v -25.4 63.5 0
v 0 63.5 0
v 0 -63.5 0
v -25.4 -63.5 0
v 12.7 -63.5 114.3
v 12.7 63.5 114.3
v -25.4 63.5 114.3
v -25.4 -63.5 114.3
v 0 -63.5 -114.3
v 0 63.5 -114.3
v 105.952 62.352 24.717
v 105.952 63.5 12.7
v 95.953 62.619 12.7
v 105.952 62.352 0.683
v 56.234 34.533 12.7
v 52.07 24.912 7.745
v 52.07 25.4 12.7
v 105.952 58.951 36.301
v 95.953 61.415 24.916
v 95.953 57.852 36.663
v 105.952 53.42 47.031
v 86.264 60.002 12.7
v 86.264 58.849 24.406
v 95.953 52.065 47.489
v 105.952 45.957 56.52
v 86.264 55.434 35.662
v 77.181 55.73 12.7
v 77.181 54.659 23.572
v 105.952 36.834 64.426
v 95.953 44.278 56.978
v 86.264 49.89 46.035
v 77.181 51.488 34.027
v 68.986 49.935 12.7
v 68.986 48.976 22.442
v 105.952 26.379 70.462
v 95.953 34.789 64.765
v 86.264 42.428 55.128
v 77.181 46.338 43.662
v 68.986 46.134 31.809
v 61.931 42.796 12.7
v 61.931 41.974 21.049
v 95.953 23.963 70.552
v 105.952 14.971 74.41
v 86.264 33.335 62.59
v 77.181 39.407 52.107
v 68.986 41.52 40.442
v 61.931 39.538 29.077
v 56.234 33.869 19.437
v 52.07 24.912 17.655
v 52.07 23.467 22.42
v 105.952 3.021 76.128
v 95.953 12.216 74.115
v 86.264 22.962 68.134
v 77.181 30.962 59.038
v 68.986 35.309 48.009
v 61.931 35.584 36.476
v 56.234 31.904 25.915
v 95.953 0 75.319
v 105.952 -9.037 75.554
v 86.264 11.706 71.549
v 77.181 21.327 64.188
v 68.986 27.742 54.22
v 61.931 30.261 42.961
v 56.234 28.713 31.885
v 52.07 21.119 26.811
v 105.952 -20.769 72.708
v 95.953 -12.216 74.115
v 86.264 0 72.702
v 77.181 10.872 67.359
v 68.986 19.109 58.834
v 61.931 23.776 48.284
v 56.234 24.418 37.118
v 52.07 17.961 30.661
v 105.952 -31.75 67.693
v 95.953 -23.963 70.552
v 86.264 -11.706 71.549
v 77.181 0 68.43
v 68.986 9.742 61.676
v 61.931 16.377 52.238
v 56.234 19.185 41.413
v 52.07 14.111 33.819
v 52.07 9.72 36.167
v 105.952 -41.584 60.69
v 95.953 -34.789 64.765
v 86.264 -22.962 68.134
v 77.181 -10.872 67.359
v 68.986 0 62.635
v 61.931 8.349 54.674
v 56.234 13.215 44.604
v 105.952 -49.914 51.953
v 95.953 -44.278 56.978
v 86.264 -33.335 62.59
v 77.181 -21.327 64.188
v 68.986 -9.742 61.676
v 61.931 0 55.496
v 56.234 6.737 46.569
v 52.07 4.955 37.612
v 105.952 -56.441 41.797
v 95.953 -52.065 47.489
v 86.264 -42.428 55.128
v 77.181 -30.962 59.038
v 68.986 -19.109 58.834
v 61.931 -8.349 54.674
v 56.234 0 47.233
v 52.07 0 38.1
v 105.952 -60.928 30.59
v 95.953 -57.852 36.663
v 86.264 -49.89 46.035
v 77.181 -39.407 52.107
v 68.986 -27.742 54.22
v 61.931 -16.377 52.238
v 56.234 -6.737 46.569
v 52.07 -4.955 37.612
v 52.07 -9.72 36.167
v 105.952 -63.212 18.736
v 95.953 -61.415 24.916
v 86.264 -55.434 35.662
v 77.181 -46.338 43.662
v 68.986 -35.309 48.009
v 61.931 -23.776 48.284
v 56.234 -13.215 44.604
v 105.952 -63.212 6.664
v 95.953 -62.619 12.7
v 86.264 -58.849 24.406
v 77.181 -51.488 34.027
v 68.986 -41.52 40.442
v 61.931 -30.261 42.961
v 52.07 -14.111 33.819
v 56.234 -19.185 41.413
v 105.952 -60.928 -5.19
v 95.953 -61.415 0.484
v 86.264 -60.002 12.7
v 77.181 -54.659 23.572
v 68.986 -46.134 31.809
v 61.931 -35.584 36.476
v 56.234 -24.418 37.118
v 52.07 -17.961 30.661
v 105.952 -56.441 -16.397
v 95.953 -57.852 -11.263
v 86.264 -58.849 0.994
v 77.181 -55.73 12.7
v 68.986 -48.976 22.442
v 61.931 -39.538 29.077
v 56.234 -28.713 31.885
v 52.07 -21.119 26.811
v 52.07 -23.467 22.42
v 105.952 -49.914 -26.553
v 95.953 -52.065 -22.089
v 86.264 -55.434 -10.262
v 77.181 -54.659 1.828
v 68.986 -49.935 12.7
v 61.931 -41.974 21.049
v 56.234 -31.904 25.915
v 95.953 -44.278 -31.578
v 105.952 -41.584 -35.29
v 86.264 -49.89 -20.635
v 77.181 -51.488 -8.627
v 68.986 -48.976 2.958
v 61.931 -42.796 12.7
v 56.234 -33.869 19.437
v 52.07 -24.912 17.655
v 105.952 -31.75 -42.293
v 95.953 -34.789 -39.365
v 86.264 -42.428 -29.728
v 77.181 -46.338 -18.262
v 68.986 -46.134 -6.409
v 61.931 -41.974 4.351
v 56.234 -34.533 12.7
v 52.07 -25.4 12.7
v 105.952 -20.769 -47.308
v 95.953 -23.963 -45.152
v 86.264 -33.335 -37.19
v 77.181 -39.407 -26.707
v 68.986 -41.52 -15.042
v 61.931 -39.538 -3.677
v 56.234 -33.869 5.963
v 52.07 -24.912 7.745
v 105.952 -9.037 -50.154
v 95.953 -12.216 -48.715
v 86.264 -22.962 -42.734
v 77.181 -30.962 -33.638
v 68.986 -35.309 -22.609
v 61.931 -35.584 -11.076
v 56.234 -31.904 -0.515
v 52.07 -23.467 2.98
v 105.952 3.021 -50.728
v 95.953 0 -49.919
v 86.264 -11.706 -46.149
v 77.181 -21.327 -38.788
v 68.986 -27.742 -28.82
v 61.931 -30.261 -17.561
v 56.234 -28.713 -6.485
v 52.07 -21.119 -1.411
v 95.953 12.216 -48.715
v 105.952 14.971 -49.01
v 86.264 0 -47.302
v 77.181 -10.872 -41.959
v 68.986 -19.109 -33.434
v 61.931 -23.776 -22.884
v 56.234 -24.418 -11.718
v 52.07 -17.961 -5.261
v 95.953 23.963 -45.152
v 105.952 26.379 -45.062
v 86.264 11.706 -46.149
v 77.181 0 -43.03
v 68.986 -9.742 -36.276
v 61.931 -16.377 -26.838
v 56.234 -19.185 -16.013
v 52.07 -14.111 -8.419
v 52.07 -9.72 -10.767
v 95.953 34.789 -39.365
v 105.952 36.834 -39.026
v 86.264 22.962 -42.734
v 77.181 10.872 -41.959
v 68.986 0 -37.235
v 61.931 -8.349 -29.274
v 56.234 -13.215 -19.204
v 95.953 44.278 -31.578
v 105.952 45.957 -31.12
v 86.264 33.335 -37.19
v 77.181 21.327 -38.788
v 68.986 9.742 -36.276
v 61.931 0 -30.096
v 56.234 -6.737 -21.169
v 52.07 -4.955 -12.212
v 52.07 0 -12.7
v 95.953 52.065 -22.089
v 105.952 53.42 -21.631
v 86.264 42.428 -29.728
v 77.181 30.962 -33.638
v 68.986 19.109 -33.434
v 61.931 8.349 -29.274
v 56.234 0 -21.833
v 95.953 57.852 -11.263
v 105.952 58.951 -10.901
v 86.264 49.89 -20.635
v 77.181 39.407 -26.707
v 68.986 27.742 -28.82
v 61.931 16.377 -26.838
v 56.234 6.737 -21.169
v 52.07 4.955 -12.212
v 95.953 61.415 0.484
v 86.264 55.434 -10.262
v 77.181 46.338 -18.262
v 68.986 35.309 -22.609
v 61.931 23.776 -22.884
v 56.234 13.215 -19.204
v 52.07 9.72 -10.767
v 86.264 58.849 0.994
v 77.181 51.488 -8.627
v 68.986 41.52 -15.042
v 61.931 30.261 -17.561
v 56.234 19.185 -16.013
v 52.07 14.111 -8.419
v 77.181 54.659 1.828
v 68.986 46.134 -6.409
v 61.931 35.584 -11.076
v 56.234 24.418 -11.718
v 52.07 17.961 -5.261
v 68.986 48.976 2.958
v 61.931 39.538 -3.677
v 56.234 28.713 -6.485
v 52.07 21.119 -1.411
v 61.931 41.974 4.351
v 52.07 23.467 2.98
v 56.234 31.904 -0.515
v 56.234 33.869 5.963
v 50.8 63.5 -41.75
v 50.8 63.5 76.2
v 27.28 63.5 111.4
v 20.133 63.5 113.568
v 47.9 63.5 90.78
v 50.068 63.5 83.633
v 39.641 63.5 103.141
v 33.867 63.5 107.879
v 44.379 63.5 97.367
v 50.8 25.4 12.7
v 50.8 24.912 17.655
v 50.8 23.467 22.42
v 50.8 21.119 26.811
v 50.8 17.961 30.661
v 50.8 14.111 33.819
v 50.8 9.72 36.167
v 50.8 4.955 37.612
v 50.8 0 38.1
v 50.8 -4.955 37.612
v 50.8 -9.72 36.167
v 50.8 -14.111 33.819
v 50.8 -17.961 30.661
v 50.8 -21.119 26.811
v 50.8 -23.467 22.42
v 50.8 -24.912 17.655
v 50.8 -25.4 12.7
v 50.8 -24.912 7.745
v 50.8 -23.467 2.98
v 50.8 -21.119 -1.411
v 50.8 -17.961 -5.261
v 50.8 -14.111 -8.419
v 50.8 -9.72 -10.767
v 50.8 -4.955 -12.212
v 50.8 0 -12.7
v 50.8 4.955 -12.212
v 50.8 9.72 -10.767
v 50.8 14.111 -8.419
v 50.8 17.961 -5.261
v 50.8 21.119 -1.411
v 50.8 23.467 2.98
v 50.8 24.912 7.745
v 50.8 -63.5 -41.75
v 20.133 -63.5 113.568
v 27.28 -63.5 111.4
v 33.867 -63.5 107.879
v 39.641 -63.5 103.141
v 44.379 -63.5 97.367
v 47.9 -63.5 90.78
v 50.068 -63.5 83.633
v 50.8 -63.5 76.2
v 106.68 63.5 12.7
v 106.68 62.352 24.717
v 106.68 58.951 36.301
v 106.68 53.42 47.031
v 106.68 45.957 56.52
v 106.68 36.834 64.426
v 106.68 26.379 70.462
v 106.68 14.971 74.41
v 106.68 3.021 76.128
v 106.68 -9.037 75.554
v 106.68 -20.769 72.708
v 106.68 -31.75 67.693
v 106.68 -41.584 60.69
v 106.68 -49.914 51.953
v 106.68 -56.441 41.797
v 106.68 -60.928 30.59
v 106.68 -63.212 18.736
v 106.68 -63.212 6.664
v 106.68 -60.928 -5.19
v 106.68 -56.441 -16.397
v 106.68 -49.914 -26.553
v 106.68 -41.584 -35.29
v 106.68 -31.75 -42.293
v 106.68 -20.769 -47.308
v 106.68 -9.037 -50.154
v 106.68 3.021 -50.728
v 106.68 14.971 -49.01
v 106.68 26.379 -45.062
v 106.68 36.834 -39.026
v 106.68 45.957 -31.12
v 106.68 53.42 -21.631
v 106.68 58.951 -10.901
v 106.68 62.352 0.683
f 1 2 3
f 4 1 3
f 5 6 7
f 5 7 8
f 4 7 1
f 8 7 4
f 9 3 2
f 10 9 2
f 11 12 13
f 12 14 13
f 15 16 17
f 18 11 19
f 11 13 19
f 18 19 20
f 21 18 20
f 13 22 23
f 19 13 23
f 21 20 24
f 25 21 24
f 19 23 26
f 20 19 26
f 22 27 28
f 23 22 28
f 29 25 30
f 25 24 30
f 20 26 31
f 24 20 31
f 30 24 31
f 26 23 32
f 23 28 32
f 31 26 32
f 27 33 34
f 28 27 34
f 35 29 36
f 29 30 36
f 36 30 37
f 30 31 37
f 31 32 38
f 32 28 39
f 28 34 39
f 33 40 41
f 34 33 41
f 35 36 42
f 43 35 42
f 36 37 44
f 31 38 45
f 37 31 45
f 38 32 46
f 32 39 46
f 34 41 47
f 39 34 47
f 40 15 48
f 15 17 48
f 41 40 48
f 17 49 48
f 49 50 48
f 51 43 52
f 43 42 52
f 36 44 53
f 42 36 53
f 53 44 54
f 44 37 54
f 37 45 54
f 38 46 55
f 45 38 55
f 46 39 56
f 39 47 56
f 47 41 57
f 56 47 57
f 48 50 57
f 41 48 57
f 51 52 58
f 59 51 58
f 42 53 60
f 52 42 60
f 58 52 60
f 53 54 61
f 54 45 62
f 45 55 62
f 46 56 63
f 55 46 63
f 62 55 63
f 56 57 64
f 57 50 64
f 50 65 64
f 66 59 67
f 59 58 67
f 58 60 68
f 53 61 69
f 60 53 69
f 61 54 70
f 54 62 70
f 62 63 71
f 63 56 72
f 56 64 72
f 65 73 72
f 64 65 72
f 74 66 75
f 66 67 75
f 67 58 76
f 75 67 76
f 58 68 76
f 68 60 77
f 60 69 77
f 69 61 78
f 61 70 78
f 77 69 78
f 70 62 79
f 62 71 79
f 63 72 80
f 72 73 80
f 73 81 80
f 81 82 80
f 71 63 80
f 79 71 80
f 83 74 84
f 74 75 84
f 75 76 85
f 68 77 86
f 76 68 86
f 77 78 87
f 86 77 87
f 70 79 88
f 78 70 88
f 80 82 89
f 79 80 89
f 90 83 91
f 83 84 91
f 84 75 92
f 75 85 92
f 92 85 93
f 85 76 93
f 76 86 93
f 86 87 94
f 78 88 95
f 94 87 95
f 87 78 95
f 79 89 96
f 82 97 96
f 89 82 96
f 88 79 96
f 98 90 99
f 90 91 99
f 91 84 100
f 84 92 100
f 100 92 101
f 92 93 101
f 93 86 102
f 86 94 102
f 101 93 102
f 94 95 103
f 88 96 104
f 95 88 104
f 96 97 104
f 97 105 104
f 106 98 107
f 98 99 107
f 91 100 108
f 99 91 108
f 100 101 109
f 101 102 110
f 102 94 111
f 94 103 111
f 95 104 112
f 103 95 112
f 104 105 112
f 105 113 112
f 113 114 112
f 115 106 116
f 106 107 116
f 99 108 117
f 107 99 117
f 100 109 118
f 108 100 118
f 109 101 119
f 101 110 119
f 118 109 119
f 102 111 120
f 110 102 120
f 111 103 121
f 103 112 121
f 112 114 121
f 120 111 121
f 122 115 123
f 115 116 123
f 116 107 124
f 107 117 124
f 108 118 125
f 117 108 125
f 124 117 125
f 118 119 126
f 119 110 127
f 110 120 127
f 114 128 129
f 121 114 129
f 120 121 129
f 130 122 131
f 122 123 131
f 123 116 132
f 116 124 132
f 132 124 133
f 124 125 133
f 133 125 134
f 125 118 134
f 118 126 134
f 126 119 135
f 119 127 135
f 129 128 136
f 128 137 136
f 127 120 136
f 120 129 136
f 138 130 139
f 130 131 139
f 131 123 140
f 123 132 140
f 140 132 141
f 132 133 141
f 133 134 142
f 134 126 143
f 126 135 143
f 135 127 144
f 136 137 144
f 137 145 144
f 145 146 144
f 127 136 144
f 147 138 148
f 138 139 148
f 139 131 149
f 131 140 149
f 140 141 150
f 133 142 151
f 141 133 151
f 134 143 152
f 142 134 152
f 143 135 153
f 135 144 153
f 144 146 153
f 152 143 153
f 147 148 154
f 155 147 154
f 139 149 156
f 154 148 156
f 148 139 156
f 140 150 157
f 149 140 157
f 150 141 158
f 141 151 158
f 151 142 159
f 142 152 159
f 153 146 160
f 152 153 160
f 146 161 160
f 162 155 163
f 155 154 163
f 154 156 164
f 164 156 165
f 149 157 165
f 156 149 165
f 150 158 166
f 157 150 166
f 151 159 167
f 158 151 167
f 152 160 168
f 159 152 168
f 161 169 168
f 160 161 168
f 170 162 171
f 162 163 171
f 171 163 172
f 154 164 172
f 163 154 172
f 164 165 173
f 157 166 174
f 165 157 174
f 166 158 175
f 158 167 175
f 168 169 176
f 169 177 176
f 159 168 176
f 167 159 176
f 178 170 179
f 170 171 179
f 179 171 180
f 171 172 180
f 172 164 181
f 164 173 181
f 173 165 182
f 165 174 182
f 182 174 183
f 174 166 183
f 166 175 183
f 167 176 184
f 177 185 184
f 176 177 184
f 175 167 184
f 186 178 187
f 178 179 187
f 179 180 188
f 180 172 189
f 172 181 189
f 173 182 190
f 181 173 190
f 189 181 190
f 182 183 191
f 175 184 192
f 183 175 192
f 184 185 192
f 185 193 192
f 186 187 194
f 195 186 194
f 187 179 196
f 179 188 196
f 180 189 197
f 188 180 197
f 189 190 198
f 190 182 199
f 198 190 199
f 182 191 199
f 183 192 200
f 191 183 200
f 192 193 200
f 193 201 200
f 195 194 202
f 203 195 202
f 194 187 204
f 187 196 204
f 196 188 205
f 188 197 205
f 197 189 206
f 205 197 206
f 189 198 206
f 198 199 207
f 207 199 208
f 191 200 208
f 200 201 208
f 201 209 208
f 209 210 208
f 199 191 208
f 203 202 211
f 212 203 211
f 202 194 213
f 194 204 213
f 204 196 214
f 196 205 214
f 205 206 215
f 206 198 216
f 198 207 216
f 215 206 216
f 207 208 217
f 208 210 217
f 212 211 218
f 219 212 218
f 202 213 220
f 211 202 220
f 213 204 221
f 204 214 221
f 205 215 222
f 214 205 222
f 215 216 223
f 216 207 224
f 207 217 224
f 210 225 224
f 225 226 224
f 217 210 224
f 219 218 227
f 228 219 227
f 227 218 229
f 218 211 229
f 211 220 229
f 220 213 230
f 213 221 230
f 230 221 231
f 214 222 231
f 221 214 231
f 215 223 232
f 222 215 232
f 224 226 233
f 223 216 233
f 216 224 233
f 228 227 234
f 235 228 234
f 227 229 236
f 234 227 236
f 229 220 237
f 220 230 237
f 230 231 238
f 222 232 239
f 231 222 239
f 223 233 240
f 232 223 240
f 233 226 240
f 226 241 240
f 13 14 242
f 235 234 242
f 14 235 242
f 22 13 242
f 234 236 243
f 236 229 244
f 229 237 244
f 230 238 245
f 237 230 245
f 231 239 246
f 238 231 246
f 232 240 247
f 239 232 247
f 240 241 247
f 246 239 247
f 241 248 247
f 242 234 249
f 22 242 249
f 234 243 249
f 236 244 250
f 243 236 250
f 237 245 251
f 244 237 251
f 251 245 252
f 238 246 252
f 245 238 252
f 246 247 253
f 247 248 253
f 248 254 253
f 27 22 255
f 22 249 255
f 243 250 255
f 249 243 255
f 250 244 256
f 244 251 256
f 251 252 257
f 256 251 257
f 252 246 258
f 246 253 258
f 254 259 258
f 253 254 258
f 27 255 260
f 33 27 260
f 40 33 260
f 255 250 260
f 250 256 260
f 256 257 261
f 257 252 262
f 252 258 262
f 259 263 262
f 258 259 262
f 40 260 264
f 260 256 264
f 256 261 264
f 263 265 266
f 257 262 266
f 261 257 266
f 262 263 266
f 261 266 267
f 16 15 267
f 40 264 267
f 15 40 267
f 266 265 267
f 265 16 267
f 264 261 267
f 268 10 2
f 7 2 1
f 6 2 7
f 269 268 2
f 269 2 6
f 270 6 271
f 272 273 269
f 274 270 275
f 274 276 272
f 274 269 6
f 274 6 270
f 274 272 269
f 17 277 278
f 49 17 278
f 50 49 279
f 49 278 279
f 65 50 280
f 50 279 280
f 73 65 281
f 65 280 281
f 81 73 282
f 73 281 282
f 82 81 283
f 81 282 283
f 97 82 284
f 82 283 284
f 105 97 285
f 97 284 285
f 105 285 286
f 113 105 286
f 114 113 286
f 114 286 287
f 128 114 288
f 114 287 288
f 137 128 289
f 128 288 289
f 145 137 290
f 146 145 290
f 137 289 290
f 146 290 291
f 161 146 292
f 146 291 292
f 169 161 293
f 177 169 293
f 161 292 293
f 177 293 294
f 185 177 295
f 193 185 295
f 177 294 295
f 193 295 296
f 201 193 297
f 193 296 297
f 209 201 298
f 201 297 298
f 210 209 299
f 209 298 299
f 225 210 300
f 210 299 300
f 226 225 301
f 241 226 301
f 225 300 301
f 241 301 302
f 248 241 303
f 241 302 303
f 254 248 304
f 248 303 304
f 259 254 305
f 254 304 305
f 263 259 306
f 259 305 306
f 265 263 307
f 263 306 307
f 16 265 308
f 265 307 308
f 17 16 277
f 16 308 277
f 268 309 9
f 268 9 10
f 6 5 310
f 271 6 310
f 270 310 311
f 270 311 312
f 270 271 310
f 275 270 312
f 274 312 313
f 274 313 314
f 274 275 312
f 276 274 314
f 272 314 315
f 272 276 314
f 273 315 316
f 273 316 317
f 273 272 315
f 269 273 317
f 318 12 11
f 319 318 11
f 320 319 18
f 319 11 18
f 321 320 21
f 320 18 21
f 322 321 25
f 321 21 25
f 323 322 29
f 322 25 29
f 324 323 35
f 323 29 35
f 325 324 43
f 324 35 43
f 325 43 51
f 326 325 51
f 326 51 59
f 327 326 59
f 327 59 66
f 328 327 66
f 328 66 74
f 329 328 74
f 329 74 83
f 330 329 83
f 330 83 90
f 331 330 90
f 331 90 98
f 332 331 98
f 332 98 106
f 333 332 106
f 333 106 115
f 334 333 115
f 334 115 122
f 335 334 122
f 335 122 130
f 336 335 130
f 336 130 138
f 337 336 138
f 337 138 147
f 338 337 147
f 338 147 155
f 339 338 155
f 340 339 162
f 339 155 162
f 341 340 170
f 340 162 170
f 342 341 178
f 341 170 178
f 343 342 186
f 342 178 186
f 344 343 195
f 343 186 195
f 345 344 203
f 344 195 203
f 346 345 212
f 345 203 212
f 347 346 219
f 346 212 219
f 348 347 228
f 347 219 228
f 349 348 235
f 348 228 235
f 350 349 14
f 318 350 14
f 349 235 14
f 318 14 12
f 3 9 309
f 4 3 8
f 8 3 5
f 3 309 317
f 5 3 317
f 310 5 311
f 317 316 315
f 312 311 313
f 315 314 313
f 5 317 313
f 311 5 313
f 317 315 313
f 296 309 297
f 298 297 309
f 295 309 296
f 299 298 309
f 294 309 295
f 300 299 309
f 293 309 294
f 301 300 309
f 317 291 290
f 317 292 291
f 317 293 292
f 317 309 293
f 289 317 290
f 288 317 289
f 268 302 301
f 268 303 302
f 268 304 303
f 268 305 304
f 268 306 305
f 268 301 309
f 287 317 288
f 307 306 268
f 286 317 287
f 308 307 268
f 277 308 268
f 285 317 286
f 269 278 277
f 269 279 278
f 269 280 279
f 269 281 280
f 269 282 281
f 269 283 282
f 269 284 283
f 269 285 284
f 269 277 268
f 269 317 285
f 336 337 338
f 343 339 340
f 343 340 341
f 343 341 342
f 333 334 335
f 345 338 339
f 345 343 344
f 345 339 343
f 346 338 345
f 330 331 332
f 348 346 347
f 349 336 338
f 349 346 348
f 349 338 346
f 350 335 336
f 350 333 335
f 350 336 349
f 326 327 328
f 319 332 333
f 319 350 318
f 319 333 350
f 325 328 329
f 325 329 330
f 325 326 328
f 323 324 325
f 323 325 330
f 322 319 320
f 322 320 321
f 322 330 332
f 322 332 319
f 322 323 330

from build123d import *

# Parameters (mm, degrees)
F0_W      = 127
F0_H      = 228.6
F1_DEPTH  = 50.8
F2_R      = 38.1
F3_SIZE2  = 72.549909
F3_SIZE   = 50.79999
F4_W      = 127
F4_H      = 12.7
F5_DEPTH  = 25.4
F6_W      = 127
F6_H      = 101.6
F7_DEPTH  = 25.4
F8_R      = 25.4
F9_DEPTH  = 1.27
F10_R     = 63.5
F11_DEPTH = 54.61


# Not quite as in the source:
# - a fillet or chamfer that OpenCascade refuses, or shapes differently, is made with other operations: its cross-section is extruded or revolved along the edge and cut away or added
# - a fillet or chamfer is up to 0.001 mm smaller than in the source, because OpenCascade refuses the exact size


with BuildPart() as f1:
    # F0 (on Right) → F1 (new body)
    with BuildSketch(Plane.YZ):
        Rectangle(F0_W, F0_H)
    extrude(amount=F1_DEPTH)

    # F2
    f2_edges = [f1.edges().sort_by_distance(p)[0] for p in [
        (50.8, 0, 114.3),
    ]]
    fillet(f2_edges, radius=F2_R)

    # F3 (size 50.8 and 72.5499187425 in the source; OpenCascade refuses exactly that, so slightly less here)
    f3_edges = [f1.edges().sort_by_distance(p)[0] for p in [
        (50.8, 0, -114.3),
    ]]
    f3_side = f1.faces().sort_by_distance((25.4, 0, -114.3))[0]
    chamfer(f3_edges, length=F3_SIZE, length2=F3_SIZE2, reference=f3_side)

    # F4 (on face) → F5 (join)
    with BuildSketch(Plane(origin=(0, 0, 0), x_dir=(0, -1, 0), z_dir=(-1, 0, 0))):
        with Locations((0, 107.95)):
            Rectangle(F4_W, F4_H)
    extrude(amount=F5_DEPTH)

    # F6 (on face) → F7 (join)
    with BuildSketch(Plane(origin=(0, 0, 0), x_dir=(0, -1, 0), z_dir=(-1, 0, 0))):
        with Locations((0, 50.8)):
            Rectangle(F6_W, F6_H)
    extrude(amount=F7_DEPTH)

    # F8 (on face) → F9 (join)
    with BuildSketch(Plane.YZ.offset(50.8)):
        with Locations((0, 12.7)):
            Circle(F8_R)
    extrude(amount=F9_DEPTH)

    # F10 (on face) → F11 (join)
    with BuildSketch(Plane.YZ.offset(52.07)):
        with Locations((0, 12.7)):
            Circle(F10_R)
    extrude(amount=F11_DEPTH)

    # F12: fillet of radius 57.15 on 1 edges, made by hand

    # F12_s1 → F12_t2 (revolve, cut)
    with BuildSketch(Plane.XY.offset(12.7)):
        with BuildLine():
            ThreePointArc((105.9515367264, 63.5), (72.9559688422, 53.0127796), (52.07, 25.4))
            Line((52.07, 25.4), (52.07, 63.5))
            Line((52.07, 63.5), (105.9515367264, 63.5))
        make_face()
    revolve(axis=Axis((52.07, 0, 12.7), (1, 0, 0)), mode=Mode.SUBTRACT)


solid = f1.part
